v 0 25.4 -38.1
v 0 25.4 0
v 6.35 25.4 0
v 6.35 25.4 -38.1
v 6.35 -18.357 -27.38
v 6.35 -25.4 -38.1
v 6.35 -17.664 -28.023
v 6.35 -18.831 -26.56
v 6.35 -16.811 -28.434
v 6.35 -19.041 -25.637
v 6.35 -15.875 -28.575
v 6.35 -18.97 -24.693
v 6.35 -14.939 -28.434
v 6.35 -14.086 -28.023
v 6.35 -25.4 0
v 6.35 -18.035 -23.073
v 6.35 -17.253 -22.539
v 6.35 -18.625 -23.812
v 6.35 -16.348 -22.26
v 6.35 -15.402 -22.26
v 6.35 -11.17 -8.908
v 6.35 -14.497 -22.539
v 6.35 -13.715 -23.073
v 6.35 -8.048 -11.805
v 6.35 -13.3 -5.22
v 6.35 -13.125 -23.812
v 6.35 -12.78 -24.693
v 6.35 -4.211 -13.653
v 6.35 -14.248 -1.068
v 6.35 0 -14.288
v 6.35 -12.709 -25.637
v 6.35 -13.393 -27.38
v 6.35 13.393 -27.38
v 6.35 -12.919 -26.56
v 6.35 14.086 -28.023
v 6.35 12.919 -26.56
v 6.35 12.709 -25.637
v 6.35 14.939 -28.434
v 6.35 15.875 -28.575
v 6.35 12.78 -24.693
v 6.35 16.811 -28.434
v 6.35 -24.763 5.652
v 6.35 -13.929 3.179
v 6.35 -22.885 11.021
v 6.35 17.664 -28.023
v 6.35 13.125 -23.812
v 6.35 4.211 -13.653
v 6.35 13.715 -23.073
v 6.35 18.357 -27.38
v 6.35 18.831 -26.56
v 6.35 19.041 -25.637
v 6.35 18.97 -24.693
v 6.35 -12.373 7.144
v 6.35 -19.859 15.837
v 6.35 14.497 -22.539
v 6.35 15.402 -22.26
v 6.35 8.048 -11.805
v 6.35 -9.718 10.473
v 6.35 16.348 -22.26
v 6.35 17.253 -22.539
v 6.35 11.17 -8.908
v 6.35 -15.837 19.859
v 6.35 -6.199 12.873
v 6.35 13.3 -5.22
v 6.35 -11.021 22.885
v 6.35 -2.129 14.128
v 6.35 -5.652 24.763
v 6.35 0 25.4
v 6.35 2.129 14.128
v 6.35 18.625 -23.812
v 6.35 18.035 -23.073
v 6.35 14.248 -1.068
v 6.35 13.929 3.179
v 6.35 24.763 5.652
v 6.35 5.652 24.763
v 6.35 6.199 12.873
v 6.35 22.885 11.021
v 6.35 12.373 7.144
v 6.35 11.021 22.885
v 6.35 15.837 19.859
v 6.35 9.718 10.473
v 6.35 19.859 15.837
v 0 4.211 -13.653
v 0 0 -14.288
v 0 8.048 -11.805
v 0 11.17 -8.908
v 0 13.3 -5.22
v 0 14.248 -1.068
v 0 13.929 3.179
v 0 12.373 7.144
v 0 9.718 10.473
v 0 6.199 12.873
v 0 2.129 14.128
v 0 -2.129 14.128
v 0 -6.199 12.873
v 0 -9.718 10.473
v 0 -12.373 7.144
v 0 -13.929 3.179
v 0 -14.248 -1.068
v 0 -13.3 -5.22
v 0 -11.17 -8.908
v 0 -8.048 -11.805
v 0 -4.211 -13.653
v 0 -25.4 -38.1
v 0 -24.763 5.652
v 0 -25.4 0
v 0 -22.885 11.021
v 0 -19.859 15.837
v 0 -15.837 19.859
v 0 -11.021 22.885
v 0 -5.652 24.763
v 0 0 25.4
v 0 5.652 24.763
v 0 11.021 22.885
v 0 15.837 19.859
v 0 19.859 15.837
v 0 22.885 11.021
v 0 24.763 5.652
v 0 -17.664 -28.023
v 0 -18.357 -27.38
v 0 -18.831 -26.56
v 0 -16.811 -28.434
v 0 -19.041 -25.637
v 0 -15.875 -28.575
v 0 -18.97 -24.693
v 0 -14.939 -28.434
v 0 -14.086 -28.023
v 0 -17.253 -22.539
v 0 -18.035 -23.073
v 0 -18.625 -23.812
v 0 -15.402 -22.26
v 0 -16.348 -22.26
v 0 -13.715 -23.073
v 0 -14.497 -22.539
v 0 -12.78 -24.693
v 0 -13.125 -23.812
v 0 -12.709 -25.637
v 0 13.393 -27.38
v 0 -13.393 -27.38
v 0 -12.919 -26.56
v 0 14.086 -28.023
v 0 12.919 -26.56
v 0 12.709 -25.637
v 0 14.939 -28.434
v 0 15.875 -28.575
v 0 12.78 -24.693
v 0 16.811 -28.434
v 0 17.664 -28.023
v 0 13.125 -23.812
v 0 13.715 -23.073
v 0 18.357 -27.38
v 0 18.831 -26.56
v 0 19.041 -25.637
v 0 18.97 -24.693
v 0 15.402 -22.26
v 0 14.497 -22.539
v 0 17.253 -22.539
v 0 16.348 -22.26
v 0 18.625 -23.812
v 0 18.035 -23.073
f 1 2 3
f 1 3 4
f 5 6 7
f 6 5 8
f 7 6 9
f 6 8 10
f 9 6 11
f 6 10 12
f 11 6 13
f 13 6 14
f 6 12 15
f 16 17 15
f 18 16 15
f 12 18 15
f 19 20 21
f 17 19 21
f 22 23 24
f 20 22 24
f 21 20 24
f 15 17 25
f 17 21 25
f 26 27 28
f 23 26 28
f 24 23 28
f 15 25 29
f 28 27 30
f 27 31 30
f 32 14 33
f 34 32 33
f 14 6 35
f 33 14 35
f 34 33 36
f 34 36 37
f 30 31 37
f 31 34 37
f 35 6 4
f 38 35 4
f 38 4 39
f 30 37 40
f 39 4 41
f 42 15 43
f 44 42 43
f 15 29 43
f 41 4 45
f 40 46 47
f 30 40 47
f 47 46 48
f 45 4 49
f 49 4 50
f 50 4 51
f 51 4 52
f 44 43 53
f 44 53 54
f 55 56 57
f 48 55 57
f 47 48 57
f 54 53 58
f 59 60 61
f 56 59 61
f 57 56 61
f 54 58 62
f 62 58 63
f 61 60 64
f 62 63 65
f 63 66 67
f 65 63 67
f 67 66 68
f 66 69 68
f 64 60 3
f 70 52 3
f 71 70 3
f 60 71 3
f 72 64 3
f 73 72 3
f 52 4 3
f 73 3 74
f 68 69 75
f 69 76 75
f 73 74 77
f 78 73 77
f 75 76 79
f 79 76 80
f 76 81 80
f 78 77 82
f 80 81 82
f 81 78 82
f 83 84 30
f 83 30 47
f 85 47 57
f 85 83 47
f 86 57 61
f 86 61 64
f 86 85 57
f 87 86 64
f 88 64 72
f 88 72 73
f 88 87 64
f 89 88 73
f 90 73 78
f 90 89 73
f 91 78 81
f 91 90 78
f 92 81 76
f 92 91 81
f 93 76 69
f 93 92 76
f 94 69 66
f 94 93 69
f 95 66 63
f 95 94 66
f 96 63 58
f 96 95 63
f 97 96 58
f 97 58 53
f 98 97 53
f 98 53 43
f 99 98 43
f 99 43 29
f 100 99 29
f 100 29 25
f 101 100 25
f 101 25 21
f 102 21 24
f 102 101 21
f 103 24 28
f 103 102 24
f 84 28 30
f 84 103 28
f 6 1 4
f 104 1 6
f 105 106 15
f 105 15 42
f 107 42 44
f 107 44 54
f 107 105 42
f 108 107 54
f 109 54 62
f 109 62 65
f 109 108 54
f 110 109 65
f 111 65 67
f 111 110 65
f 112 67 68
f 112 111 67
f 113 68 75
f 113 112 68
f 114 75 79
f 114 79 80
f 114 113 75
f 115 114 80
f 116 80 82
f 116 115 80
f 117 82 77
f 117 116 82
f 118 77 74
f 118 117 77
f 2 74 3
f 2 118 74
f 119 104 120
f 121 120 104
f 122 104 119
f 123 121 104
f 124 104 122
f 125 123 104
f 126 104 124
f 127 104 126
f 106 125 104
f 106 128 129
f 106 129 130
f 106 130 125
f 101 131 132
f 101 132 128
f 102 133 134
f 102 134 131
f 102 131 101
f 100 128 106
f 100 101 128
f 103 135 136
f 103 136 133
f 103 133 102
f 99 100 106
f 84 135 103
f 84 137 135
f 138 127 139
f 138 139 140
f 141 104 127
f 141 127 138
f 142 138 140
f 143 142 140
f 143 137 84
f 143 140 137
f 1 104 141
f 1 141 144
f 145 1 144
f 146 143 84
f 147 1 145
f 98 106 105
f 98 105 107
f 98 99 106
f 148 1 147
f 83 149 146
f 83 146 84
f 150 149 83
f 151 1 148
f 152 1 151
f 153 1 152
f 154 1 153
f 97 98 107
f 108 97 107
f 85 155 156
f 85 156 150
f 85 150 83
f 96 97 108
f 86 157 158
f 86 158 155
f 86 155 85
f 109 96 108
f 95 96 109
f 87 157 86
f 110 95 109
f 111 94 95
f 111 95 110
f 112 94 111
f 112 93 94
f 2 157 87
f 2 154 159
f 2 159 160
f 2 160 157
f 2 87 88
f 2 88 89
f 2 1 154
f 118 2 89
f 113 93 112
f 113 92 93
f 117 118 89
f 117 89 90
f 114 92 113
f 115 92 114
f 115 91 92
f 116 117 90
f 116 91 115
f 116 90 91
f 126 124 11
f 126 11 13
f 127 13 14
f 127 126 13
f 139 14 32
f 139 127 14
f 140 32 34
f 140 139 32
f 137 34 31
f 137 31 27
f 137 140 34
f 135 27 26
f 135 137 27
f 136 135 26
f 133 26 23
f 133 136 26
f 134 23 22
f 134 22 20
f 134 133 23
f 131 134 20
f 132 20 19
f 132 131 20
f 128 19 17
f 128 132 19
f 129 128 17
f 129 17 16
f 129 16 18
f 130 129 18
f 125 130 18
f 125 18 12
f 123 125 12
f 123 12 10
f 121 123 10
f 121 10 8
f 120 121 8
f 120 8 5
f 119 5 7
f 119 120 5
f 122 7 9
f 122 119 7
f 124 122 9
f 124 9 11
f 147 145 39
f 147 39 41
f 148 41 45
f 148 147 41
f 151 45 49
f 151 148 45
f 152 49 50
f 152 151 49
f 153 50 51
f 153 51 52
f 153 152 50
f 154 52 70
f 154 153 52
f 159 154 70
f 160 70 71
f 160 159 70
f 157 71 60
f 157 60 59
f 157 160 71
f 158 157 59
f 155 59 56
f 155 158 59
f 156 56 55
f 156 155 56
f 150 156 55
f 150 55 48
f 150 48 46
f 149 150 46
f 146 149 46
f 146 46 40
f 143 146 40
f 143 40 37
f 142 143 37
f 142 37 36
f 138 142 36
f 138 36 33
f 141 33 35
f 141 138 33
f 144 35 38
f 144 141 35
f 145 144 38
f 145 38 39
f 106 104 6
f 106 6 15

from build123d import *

# Parameters (mm, degrees)
SKETCH1_R           = 14.2875
SKETCH1_R_2         = 3.175
BOSS_EXTRUDE1_DEPTH = 6.35


with BuildPart() as part:
    # Sketch1 → Boss-Extrude1 (new body)
    with BuildSketch(Plane(origin=(0, 0, 0), x_dir=(0, 0, -1), z_dir=(1, 0, 0))):
        with BuildLine():
            Line((0, 25.4), (38.1, 25.4))
            Line((38.1, 25.4), (38.1, -25.4))
            Line((38.1, -25.4), (0, -25.4))
            ThreePointArc((0, -25.4), (-25.4, 0), (0, 25.4))
        make_face()
        Circle(SKETCH1_R, mode=Mode.SUBTRACT)
        with Locations((25.4, 15.875)):
            Circle(SKETCH1_R_2, mode=Mode.SUBTRACT)
        with Locations((25.4, -15.875)):
            Circle(SKETCH1_R_2, mode=Mode.SUBTRACT)
    extrude(amount=BOSS_EXTRUDE1_DEPTH)


solid = part.part
